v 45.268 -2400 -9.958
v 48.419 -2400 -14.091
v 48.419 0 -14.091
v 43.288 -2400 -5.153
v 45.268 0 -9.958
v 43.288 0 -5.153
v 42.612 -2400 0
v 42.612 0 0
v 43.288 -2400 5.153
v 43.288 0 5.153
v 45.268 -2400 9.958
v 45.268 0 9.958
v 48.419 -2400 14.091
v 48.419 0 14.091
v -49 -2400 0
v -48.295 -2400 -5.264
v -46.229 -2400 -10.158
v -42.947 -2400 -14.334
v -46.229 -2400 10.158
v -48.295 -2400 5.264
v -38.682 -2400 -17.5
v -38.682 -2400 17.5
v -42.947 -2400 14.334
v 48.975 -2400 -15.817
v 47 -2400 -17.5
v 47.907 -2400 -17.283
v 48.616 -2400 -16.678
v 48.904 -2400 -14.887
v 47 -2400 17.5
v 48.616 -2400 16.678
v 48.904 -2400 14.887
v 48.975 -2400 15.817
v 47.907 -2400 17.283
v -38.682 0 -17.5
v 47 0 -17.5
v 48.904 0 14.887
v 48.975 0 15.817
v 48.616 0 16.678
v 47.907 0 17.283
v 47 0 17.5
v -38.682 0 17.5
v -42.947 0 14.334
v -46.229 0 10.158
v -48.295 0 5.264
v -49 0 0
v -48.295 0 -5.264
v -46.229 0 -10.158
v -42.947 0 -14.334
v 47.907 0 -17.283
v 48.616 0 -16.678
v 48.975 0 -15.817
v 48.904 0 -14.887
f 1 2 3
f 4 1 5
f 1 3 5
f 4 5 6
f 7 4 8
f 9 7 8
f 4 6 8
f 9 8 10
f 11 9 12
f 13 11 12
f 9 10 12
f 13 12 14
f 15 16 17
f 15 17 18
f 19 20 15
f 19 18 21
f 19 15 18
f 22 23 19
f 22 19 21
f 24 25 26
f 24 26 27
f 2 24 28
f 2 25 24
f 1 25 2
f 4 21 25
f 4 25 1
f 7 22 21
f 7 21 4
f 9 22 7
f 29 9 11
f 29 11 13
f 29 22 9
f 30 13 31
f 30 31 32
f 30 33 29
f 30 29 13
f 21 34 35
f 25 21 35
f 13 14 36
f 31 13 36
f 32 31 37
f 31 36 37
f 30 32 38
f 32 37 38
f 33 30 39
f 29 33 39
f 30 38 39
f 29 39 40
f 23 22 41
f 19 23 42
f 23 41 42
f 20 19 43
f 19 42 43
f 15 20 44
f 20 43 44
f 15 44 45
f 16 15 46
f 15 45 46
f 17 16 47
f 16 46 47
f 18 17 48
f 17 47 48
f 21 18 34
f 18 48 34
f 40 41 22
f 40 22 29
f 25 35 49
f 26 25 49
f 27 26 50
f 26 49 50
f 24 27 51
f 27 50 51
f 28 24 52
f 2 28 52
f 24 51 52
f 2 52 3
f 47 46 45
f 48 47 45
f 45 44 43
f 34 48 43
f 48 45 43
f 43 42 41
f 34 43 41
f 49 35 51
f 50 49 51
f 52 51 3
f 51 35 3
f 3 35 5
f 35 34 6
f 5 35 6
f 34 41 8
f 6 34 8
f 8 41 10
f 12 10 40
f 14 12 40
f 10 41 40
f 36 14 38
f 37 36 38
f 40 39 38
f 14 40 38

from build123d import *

# Parameters (mm, degrees)
F0_W     = 100
F0_H     = 35
F1_DEPTH = 2400
F3_DEPTH = 2400


with BuildPart() as f1:
    # F0 (on Front) → F1 (new body)
    with BuildSketch(Plane.XZ):
        Rectangle(F0_W, F0_H)
    extrude(amount=F1_DEPTH)

    # F2 (on face) → F3 (cut, through all)
    with BuildSketch(Plane(origin=(0, 0, 0), x_dir=(-1, 0, 0), z_dir=(0, 1, 0))):
        with BuildLine():
            Line((-50, -17.5), (-47, -17.5))
            ThreePointArc((-47, -17.5), (-48.846372, -16.268706), (-48.419318, -14.090909))
            ThreePointArc((-48.419318, -14.090909), (-42.612495, 0), (-48.419318, 14.090909))
            ThreePointArc((-48.419318, 14.090909), (-48.846372, 16.268706), (-47, 17.5))
            Line((-47, 17.5), (-50, 17.5))
            Line((-50, 17.5), (-50, -17.5))
        make_face()
        with BuildLine():
            ThreePointArc((38.682458, 17.5), (49, 0), (38.682458, -17.5))
            Line((38.682458, -17.5), (50, -17.5))
            Line((50, -17.5), (50, 17.5))
            Line((50, 17.5), (38.682458, 17.5))
        make_face()
    extrude(amount=-F3_DEPTH, mode=Mode.SUBTRACT)


solid = f1.part
